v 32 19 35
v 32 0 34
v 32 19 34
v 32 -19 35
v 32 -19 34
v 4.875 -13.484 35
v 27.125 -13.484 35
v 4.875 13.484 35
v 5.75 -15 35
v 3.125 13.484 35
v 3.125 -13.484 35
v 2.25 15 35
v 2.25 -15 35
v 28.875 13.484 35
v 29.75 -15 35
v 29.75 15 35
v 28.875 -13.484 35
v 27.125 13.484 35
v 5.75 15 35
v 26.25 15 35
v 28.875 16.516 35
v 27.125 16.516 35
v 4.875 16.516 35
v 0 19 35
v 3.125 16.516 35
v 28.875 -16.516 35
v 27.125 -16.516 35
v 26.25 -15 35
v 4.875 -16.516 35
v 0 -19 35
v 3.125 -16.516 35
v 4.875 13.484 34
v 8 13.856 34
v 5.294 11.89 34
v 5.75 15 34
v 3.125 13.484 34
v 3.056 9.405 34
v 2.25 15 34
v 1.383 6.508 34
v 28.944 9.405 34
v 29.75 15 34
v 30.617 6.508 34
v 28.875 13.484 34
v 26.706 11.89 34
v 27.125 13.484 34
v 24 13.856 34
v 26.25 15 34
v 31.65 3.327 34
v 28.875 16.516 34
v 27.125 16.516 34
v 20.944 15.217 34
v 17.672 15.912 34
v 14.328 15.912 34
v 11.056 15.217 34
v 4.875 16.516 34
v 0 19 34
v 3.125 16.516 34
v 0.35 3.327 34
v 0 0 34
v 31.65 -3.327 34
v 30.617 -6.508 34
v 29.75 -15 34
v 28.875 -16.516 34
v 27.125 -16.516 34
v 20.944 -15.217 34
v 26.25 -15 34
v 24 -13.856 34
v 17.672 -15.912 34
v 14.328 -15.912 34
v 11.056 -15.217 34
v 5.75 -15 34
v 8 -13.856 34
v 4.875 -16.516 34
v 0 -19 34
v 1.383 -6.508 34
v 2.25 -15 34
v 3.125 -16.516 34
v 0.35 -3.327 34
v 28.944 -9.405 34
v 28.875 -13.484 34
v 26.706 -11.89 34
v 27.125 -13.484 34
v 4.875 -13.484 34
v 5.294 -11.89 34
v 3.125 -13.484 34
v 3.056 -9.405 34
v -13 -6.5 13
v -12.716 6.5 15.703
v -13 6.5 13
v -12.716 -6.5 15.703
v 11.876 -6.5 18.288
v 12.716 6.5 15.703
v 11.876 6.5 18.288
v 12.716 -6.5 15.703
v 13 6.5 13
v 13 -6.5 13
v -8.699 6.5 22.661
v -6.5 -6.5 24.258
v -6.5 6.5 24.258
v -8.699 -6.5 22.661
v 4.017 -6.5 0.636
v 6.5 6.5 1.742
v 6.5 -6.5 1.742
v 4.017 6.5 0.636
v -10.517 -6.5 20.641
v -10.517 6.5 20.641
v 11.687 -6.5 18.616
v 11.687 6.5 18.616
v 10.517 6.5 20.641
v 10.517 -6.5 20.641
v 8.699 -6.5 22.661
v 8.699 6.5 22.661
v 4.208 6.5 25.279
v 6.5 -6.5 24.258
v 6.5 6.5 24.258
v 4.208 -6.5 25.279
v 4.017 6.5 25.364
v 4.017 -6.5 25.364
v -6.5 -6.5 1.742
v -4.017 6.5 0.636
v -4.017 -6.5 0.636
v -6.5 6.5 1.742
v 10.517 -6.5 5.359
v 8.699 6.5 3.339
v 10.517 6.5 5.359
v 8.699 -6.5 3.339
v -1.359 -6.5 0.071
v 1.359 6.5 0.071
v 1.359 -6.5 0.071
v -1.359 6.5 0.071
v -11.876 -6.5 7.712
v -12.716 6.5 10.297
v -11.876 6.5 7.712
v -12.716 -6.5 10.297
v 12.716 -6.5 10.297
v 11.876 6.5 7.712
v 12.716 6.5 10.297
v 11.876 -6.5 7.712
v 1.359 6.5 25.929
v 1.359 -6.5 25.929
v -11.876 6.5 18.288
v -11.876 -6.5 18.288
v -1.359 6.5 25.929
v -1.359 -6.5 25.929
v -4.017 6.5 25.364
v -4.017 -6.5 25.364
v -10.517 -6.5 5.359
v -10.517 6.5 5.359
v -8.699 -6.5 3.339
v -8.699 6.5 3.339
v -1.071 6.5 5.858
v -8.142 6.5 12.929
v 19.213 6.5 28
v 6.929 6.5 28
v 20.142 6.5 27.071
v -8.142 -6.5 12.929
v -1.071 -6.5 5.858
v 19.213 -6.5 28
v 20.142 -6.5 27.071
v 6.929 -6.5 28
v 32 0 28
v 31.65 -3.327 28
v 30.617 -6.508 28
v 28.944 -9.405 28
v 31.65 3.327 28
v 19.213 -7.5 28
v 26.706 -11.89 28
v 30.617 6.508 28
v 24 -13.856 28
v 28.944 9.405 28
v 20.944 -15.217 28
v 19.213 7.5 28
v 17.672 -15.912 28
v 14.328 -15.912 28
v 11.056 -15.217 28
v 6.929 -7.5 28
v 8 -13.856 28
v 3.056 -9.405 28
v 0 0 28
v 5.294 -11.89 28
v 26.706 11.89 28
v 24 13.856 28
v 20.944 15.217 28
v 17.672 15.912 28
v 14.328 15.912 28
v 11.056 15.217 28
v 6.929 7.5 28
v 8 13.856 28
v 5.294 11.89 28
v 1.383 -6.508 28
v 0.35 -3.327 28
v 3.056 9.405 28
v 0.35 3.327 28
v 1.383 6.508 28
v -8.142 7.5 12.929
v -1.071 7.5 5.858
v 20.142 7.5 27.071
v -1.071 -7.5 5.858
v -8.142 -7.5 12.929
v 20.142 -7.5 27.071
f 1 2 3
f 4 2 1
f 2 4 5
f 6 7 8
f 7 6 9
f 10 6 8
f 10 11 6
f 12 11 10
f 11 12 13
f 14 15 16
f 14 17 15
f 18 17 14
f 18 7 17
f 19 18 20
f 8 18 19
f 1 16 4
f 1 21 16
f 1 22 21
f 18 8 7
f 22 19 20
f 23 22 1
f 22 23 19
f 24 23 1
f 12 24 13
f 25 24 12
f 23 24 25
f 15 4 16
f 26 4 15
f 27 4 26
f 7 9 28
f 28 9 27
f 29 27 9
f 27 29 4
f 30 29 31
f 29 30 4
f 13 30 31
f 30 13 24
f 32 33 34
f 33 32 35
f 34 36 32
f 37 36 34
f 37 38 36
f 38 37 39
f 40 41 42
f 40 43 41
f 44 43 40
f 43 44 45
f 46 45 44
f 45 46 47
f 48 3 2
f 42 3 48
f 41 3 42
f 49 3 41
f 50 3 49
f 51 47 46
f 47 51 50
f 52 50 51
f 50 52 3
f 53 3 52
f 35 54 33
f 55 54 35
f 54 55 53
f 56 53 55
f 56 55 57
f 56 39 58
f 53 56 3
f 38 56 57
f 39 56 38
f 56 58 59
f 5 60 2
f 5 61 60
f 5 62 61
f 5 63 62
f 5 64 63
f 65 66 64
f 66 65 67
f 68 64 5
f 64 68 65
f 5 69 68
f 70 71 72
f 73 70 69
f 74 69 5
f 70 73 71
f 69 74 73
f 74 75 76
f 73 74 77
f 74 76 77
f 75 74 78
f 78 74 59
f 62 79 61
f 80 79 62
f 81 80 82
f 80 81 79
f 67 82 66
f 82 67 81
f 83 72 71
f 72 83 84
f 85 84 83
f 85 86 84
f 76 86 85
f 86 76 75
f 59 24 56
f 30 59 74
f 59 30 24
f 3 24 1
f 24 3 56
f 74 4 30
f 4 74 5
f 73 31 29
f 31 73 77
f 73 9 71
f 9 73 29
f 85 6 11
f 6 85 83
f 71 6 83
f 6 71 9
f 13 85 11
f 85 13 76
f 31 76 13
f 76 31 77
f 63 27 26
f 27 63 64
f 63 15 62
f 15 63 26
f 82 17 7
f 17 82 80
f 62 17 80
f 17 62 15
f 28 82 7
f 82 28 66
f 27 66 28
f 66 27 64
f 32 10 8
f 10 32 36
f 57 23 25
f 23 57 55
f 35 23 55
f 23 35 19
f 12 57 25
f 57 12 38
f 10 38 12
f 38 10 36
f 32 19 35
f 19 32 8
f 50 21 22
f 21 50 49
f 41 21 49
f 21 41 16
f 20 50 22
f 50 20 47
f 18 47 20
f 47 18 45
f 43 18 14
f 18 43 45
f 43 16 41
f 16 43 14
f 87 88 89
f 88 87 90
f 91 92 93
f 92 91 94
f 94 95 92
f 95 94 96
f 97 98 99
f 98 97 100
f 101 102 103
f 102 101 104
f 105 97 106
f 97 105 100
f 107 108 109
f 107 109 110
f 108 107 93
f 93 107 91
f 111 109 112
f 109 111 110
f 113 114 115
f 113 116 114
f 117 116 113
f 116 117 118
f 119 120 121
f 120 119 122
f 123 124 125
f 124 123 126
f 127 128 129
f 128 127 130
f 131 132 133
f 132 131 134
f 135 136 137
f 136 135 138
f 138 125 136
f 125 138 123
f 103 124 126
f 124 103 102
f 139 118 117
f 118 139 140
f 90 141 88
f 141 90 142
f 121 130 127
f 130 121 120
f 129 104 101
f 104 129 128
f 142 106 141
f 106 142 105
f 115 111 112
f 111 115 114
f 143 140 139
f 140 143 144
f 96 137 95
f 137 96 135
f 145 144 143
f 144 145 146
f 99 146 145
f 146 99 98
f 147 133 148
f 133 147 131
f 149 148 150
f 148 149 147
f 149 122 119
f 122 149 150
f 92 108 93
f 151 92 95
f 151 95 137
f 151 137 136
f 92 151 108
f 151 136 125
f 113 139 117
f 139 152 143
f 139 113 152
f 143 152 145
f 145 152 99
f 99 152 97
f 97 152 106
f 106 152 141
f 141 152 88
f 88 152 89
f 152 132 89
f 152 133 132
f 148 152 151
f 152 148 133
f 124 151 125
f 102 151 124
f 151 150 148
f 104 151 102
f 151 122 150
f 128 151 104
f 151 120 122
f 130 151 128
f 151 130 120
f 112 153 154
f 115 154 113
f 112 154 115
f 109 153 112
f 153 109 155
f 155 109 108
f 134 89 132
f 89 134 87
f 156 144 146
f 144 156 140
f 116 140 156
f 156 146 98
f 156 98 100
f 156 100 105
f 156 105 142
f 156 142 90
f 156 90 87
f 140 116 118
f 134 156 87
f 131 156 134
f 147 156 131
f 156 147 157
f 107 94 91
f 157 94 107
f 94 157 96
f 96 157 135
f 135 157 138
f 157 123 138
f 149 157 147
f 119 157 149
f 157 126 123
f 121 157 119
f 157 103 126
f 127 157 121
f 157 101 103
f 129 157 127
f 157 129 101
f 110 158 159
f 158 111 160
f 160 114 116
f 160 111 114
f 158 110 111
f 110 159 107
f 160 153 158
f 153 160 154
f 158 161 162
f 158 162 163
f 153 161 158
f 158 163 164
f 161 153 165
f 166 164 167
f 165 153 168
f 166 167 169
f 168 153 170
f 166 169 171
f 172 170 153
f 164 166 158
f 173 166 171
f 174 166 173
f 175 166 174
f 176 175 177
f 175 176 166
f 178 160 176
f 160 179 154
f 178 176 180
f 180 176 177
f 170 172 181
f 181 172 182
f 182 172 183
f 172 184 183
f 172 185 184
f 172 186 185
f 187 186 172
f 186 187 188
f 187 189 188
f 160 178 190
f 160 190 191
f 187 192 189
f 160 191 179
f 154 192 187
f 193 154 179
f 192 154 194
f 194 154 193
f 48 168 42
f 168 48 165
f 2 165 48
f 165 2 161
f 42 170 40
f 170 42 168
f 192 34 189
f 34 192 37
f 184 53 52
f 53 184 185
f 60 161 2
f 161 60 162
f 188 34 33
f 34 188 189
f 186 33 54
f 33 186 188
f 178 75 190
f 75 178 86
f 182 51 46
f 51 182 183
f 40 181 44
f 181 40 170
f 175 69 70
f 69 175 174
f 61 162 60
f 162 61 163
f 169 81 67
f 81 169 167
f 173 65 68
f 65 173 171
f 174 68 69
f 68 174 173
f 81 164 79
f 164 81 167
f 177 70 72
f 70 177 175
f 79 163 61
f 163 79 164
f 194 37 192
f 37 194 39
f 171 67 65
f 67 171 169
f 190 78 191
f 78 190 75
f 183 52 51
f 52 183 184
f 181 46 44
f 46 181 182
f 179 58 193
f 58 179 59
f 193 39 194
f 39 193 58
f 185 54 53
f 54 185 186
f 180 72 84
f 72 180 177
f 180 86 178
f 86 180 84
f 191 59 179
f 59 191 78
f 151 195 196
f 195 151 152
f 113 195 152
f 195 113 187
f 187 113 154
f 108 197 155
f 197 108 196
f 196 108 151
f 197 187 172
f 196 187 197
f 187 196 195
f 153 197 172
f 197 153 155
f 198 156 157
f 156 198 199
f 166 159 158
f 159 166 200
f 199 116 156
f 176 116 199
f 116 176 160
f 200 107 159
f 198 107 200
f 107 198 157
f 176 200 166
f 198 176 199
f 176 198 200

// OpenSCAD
diam = 26;
thickness = 13;
height = 35;

support_length = 38;
support_width = 32;
support_thickness = 1;
hole_length = 30;
hole_width = 24;
hole = 3.5; 

tube_diam = 32;
tube_height = 6;

join_length = 30;
join_thickness = 1;
join_height = 10;



translate([0, 0, diam/2]) {
    rotate([90, 0, 0]) {
        translate([0, 0, -thickness/2]) {
            cylinder(r = diam/2, h=13);
        }
    }
}

difference() {
    translate([
        0, //-support_width / 2,
        -support_length / 2,
        height - support_thickness
    ]) {
        cube([support_width, support_length, support_thickness]);
    }
    translate([
        (support_width - hole_width)/2,
        -hole_length/2,
        height - 2*support_thickness
    ]) {
        cylinder(h = 3*support_thickness, r = hole/2);
    }

    translate([
        (support_width - hole_width)/2 + hole_width,
        -hole_length/2,
        height - 2*support_thickness
    ]) {
        cylinder(h = 3*support_thickness, r = hole/2);
    }

    translate([
        (support_width - hole_width)/2,
        hole_length/2,
        height - 2*support_thickness
    ]) {
        cylinder(h = 3*support_thickness, r = hole/2);
    }

    translate([
        (support_width - hole_width)/2 + hole_width,
        hole_length/2,
        height - 2*support_thickness
    ]) {
        cylinder(h = 3*support_thickness, r = hole/2);
    }
}

translate([
    support_width/2,
    0,
    height - tube_height - support_thickness
]) {
    cylinder(r = tube_diam/2, h = tube_height);
};

translate([6, thickness/2, 20]) {
    rotate([0, -45, 0]) {
        translate([-join_length/2, 0, -join_height/2]) {
            cube([join_length, join_thickness, join_height]);
        }
    }
}

translate([6, -thickness/2 - join_thickness, 20]) {
    rotate([0, -45, 0]) {
        translate([-join_length/2, 0, -join_height/2]) {
            cube([join_length, join_thickness, join_height]);
        }
    }
}
